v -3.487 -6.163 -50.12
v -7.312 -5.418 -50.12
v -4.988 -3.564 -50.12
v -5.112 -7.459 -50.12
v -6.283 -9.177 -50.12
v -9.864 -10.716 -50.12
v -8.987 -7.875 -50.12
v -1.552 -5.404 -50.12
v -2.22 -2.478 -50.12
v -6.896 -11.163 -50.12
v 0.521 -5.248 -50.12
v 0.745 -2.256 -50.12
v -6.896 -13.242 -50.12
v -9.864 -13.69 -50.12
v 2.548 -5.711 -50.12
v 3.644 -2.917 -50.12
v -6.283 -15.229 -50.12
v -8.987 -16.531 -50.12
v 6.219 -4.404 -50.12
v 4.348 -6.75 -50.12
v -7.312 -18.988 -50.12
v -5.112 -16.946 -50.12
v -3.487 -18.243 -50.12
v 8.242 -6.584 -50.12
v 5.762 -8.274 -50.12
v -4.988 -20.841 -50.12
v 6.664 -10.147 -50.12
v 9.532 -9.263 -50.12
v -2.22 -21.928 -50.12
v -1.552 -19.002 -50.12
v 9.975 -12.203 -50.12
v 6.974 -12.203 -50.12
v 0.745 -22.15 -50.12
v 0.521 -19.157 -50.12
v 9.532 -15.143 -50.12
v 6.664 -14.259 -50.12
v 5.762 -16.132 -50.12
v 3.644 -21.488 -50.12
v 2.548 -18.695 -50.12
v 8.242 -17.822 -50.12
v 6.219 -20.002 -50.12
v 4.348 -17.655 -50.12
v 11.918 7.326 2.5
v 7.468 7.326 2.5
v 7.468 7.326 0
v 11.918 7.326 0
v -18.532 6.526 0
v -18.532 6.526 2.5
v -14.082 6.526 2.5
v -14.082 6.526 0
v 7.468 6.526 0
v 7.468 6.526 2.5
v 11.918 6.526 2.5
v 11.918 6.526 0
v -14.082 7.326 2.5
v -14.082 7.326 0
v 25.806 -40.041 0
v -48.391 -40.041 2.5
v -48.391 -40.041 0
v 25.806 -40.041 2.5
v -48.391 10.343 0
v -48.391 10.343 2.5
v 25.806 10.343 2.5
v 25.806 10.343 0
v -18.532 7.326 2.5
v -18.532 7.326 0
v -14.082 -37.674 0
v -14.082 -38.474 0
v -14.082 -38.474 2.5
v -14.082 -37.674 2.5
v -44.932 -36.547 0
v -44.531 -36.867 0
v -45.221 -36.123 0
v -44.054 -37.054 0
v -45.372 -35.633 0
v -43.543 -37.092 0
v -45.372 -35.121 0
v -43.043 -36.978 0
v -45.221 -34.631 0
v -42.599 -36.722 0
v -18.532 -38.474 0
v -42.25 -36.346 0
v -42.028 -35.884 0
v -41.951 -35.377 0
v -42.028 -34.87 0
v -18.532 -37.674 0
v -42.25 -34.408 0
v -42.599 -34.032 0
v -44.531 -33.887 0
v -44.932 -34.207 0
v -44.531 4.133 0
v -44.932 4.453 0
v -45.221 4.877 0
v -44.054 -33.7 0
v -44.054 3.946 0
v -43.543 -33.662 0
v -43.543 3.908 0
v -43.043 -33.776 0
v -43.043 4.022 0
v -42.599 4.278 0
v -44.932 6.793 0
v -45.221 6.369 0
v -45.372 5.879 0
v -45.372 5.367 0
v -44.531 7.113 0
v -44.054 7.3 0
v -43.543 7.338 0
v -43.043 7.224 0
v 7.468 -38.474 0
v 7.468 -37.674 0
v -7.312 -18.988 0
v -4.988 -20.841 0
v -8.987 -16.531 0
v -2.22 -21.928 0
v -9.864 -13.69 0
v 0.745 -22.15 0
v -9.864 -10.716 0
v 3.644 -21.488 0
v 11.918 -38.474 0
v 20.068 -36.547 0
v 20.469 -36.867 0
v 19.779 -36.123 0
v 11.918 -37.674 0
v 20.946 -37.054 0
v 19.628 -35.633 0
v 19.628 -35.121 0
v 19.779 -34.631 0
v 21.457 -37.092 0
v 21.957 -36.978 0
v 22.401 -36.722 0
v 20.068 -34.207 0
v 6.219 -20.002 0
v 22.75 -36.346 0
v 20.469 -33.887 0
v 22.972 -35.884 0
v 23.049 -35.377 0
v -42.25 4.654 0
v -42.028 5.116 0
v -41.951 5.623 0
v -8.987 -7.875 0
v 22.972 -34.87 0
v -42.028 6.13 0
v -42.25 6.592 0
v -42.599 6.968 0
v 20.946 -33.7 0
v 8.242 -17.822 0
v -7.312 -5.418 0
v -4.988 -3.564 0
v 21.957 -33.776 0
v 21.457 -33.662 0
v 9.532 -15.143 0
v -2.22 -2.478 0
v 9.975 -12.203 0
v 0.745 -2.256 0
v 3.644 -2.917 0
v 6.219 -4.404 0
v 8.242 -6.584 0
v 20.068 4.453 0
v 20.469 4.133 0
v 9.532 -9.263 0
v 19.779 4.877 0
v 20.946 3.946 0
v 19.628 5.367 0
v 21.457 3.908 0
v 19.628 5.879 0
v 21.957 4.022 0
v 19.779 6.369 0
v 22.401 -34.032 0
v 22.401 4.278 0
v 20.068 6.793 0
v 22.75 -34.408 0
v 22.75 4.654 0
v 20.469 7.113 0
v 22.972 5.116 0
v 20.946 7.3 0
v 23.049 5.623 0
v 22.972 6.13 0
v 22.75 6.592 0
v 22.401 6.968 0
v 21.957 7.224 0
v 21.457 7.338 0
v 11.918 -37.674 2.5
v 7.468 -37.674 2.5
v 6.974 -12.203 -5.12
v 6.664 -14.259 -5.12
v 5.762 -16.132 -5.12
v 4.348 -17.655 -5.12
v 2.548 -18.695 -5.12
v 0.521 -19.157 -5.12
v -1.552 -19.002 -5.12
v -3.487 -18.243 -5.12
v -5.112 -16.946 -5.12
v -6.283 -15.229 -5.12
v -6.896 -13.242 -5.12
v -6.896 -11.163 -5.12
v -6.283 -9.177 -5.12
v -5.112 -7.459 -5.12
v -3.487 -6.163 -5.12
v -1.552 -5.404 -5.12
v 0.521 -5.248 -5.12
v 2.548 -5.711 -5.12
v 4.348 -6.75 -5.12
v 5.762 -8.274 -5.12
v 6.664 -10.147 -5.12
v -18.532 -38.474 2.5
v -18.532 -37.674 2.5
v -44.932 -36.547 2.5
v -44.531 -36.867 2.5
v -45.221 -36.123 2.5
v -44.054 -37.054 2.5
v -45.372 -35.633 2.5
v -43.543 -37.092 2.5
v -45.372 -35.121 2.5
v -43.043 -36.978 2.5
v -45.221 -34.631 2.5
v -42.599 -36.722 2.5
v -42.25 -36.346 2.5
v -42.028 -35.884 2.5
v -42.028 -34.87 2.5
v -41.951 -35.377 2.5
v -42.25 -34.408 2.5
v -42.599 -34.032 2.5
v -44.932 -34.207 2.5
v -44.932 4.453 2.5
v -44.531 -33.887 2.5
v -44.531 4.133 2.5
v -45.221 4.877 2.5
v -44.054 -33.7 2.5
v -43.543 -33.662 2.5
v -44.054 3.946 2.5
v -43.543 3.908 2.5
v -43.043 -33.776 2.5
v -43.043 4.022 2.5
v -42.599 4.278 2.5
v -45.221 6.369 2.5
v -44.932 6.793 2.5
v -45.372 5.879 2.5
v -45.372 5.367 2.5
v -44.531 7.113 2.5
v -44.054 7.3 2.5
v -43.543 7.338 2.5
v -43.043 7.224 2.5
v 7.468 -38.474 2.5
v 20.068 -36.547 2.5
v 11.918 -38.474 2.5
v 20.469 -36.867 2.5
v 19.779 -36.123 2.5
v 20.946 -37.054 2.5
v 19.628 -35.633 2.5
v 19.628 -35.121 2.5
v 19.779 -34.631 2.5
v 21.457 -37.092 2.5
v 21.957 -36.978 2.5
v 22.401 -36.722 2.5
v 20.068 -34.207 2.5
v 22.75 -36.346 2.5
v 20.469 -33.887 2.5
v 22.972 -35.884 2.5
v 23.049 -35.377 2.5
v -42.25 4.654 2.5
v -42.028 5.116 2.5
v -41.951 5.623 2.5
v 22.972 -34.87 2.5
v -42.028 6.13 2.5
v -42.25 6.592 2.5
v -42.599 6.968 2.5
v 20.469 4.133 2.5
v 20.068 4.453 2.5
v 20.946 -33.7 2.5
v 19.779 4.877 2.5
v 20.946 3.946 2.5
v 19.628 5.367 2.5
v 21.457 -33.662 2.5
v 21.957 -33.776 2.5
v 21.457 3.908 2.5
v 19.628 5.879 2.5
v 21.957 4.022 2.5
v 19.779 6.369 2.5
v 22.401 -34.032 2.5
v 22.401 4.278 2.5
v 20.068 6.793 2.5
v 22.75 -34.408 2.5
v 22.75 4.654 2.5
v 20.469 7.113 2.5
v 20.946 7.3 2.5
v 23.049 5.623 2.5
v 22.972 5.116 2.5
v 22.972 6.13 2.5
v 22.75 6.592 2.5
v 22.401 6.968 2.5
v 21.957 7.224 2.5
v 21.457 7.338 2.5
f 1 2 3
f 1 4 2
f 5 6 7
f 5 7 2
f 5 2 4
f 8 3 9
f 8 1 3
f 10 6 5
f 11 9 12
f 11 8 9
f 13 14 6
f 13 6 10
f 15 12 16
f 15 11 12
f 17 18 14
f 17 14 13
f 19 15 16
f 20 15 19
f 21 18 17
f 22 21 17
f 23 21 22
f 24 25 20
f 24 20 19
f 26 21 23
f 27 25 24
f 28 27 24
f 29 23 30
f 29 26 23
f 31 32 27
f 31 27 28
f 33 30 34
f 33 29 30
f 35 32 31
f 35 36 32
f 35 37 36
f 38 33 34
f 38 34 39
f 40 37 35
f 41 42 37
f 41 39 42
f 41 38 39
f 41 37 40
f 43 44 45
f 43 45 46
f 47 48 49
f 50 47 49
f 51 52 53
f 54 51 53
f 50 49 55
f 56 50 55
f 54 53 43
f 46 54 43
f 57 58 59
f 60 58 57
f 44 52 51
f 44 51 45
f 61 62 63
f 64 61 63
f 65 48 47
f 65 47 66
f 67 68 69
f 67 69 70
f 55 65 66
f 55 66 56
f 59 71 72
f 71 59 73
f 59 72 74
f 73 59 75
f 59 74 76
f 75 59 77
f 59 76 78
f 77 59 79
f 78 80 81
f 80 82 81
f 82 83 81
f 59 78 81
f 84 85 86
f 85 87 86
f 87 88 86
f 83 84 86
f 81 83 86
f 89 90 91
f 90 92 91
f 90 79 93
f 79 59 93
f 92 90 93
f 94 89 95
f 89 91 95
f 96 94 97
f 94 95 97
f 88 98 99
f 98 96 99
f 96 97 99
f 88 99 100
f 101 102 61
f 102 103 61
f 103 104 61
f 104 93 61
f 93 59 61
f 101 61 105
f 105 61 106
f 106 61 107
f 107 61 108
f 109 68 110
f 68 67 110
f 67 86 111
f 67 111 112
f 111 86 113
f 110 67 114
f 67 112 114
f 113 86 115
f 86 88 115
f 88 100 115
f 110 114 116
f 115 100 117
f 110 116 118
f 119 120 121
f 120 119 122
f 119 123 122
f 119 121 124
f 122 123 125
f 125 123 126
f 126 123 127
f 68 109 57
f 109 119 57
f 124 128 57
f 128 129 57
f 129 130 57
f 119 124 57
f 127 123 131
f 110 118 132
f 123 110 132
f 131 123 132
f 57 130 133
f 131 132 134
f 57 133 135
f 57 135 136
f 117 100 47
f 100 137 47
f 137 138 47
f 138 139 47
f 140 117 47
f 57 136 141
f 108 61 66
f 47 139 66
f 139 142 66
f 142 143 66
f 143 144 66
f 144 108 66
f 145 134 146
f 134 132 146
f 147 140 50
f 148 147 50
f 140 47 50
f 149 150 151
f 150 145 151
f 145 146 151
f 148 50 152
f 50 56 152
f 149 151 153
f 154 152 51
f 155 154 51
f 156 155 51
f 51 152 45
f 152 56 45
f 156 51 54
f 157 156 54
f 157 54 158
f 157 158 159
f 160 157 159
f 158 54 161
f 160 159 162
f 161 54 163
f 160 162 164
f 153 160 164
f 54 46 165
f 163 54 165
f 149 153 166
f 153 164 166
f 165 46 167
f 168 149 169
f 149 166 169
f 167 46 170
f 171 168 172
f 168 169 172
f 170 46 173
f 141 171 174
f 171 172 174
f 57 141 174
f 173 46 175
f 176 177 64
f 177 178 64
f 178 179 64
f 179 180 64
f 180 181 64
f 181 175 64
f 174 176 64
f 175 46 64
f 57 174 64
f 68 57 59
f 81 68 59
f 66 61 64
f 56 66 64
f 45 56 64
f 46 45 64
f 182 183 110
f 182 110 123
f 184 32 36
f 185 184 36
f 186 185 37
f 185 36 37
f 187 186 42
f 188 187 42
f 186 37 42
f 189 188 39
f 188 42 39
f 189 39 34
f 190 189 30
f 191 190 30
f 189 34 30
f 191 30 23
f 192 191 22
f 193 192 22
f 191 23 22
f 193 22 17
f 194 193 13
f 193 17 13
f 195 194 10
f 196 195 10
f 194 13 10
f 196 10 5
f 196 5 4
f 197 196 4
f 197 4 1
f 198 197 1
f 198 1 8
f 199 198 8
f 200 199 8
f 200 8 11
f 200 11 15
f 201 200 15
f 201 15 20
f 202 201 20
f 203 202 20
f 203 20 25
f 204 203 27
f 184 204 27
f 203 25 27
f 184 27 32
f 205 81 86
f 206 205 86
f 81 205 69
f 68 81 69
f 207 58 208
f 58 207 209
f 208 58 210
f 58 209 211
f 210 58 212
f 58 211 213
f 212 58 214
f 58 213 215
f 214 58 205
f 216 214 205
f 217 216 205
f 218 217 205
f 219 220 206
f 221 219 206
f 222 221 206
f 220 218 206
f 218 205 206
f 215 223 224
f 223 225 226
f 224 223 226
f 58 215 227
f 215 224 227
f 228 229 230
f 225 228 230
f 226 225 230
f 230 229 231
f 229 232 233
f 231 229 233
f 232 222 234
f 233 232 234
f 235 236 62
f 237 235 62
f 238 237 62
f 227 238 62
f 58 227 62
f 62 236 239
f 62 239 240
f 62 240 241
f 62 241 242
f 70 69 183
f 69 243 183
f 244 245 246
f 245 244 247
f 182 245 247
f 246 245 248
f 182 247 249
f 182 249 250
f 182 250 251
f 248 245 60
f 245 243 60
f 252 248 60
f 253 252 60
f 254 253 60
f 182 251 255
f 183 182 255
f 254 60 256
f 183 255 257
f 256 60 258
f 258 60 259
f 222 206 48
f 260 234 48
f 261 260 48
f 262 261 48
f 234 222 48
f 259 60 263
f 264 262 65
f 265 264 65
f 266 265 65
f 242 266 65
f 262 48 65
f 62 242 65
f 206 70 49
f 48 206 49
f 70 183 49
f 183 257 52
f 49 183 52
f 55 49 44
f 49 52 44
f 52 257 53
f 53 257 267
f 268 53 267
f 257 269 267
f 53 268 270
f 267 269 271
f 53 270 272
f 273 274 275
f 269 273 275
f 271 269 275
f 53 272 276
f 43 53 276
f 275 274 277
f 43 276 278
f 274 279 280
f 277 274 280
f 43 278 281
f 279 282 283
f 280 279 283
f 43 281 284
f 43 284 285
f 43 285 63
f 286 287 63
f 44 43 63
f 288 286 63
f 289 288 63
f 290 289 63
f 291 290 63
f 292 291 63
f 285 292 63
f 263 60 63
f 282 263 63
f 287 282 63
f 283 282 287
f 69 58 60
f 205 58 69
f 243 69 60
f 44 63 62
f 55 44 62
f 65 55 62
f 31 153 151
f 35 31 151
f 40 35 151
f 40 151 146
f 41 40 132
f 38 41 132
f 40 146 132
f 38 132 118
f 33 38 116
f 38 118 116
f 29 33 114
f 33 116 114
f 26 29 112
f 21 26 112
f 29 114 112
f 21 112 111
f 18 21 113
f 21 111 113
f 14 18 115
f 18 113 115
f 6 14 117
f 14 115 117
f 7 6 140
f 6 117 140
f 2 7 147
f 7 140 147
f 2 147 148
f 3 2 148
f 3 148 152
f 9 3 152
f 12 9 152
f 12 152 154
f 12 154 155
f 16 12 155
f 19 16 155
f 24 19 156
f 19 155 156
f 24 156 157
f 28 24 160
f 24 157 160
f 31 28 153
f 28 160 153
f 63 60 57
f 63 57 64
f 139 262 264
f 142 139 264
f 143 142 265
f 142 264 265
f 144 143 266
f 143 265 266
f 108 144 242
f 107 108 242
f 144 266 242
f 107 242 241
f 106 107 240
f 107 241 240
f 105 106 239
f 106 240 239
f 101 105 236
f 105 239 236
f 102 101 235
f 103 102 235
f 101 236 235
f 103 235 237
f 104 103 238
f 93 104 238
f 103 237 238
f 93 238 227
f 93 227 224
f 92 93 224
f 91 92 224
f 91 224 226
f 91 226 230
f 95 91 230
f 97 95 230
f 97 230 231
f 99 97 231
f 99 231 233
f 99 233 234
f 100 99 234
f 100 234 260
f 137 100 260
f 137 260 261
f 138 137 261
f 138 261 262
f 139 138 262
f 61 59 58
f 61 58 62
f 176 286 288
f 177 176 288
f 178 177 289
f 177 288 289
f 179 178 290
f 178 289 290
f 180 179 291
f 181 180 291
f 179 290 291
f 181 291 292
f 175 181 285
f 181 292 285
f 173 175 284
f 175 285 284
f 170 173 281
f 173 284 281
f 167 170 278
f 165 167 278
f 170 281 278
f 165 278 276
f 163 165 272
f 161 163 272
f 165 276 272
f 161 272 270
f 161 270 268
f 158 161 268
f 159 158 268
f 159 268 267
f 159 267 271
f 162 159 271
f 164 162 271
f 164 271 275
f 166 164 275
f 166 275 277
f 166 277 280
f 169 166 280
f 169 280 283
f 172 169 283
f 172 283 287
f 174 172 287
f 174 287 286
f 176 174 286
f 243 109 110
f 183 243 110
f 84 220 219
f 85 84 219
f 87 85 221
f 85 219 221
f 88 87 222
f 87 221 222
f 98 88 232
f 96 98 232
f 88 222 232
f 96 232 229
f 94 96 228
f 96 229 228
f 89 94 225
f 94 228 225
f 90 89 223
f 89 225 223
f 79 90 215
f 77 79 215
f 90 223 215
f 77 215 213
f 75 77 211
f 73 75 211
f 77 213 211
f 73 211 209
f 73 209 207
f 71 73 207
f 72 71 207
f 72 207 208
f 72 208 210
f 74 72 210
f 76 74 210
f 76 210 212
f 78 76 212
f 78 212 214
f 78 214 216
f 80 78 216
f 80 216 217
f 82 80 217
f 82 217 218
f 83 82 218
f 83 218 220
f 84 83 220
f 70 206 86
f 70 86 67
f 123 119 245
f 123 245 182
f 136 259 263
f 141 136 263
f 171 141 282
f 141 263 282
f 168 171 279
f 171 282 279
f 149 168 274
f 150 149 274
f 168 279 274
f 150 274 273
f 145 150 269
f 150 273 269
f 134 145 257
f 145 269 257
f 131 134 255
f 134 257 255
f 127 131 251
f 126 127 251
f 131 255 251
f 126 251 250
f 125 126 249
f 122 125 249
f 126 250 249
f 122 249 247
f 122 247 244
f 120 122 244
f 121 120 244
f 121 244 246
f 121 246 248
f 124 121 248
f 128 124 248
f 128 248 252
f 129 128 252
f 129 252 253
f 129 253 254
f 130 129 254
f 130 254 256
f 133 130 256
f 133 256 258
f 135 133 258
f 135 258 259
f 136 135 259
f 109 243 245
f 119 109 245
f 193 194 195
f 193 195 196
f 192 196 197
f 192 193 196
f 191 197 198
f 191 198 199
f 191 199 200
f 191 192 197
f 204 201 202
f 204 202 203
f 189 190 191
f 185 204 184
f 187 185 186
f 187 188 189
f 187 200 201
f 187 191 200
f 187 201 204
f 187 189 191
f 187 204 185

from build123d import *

# Parameters (mm, degrees)
F0_W      = 99.28
F0_H      = 99.28
F1_DEPTH  = 5
F2_R      = 9.975
F3_DEPTH  = 50.12
F4_R      = 6.97414
F5_DEPTH  = 45
F6_W      = 10.15
F6_H      = 33.35
F7_DEPTH  = 51.54
F8_W      = 19.84
F8_H      = 17.26
F9_DEPTH  = 30.101
F10_R     = 1.715
F11_DEPTH = 30.101
F12_W     = 99.28
F12_H     = 26.759172
F13_DEPTH = 55.121
F14_W     = 25.082288
F14_H     = 72.520828
F15_DEPTH = 55.121
F16_W     = 74.197712
F16_H     = 22.137212
F17_DEPTH = 55.121
F18_R     = 1.715
F19_DEPTH = 30.101
F20_W     = 4.45
F20_H     = 0.8
F21_DEPTH = 55.121
F22_R     = 1.72
F23_DEPTH = 55.121
F24_W     = 52.245434
F24_H     = 58.427127
F25_DEPTH = 74.198713


with BuildPart() as f1:
    # F0 (on Top) → F1 (new body)
    with BuildSketch(Plane.XY):
        with Locations((1.248532, -12.53785)):
            Rectangle(F0_W, F0_H)
    extrude(amount=F1_DEPTH)

    # F2 (on face) → F3 (join)
    with BuildSketch(Plane(origin=(0, 0, 0), x_dir=(1, 0, 0), z_dir=(0, 0, -1))):
        with Locations((0, 12.20285)):
            Circle(F2_R)
    extrude(amount=F3_DEPTH)

    # F4 (on face) → F5 (cut)
    with BuildSketch(Plane(origin=(0, 0, -50.12), x_dir=(1, 0, 0), z_dir=(0, 0, -1))):
        with Locations((0, 12.20285)):
            Circle(F4_R)
    extrude(amount=-F5_DEPTH, mode=Mode.SUBTRACT)

    # F6 (on face) → F7 (join)
    with BuildSketch(Plane.XY.offset(5)):
        with Locations((-23.366468, -12.46285)):
            Rectangle(F6_W, F6_H)
    extrude(amount=F7_DEPTH)

    # F8 (on face) → F9 (cut, through all)
    with BuildSketch(Plane.YZ.offset(-18.291468)):
        with Locations((-12.51785, 47.91)):
            Rectangle(F8_W, F8_H)
    extrude(amount=-F9_DEPTH, mode=Mode.SUBTRACT)

    # F10 (on face) → F11 (cut, through all)
    with BuildSketch(Plane.YZ.offset(-18.291468)):
        with Locations((-25.66285, 52.125)):
            Circle(F10_R)
        with Locations((-25.66285, 47.205)):
            Circle(F10_R)
    extrude(amount=-F11_DEPTH, mode=Mode.SUBTRACT)

    # F12 (on face) → F13 (cut, through all)
    with BuildSketch(Plane.XY.offset(5)):
        with Locations((1.248532, 23.722564)):
            Rectangle(F12_W, F12_H)
    extrude(amount=-F13_DEPTH, mode=Mode.SUBTRACT)

    # F14 (on face) → F15 (cut, through all)
    with BuildSketch(Plane.XY.offset(5)):
        with Locations((38.347388, -25.917436)):
            Rectangle(F14_W, F14_H)
    extrude(amount=-F15_DEPTH, mode=Mode.SUBTRACT)

    # F16 (on face) → F17 (cut, through all)
    with BuildSketch(Plane.XY.offset(5)):
        with Locations((-11.292612, -51.109244)):
            Rectangle(F16_W, F16_H)
    extrude(amount=-F17_DEPTH, mode=Mode.SUBTRACT)

    # F18 (on face) → F19 (cut, through all)
    with BuildSketch(Plane.YZ.offset(-18.291468)):
        with Locations((0.73715, 52.125)):
            Circle(F18_R)
        with Locations((0.73715, 47.205)):
            Circle(F18_R)
    extrude(amount=-F19_DEPTH, mode=Mode.SUBTRACT)

    # F20 (on face) → F21 (cut, through all)
    with BuildSketch(Plane.XY.offset(5)):
        with Locations((-16.306812, -38.074275)):
            Rectangle(F20_W, F20_H)
        with Locations((-16.306812, 6.925725)):
            Rectangle(F20_W, F20_H)
        with Locations((9.693188, -38.074275)):
            Rectangle(F20_W, F20_H)
        with Locations((9.693188, 6.925725)):
            Rectangle(F20_W, F20_H)
    extrude(amount=-F21_DEPTH, mode=Mode.SUBTRACT)

    # F22 (on face) → F23 (cut, through all)
    with BuildSketch(Plane.XY.offset(5)):
        with Locations((-43.671468, 5.622978)):
            Circle(F22_R)
        with Locations((-43.671468, -35.377022)):
            Circle(F22_R)
        with Locations((21.328532, 5.622978)):
            Circle(F22_R)
        with Locations((21.328532, -35.377022)):
            Circle(F22_R)
    extrude(amount=-F23_DEPTH, mode=Mode.SUBTRACT)

    # F24 (on face) → F25 (cut, through all)
    with BuildSketch(Plane.YZ.offset(25.806244)):
        with Locations((-13.917921, 31.713563)):
            Rectangle(F24_W, F24_H)
    extrude(amount=-F25_DEPTH, mode=Mode.SUBTRACT)


solid = f1.part
